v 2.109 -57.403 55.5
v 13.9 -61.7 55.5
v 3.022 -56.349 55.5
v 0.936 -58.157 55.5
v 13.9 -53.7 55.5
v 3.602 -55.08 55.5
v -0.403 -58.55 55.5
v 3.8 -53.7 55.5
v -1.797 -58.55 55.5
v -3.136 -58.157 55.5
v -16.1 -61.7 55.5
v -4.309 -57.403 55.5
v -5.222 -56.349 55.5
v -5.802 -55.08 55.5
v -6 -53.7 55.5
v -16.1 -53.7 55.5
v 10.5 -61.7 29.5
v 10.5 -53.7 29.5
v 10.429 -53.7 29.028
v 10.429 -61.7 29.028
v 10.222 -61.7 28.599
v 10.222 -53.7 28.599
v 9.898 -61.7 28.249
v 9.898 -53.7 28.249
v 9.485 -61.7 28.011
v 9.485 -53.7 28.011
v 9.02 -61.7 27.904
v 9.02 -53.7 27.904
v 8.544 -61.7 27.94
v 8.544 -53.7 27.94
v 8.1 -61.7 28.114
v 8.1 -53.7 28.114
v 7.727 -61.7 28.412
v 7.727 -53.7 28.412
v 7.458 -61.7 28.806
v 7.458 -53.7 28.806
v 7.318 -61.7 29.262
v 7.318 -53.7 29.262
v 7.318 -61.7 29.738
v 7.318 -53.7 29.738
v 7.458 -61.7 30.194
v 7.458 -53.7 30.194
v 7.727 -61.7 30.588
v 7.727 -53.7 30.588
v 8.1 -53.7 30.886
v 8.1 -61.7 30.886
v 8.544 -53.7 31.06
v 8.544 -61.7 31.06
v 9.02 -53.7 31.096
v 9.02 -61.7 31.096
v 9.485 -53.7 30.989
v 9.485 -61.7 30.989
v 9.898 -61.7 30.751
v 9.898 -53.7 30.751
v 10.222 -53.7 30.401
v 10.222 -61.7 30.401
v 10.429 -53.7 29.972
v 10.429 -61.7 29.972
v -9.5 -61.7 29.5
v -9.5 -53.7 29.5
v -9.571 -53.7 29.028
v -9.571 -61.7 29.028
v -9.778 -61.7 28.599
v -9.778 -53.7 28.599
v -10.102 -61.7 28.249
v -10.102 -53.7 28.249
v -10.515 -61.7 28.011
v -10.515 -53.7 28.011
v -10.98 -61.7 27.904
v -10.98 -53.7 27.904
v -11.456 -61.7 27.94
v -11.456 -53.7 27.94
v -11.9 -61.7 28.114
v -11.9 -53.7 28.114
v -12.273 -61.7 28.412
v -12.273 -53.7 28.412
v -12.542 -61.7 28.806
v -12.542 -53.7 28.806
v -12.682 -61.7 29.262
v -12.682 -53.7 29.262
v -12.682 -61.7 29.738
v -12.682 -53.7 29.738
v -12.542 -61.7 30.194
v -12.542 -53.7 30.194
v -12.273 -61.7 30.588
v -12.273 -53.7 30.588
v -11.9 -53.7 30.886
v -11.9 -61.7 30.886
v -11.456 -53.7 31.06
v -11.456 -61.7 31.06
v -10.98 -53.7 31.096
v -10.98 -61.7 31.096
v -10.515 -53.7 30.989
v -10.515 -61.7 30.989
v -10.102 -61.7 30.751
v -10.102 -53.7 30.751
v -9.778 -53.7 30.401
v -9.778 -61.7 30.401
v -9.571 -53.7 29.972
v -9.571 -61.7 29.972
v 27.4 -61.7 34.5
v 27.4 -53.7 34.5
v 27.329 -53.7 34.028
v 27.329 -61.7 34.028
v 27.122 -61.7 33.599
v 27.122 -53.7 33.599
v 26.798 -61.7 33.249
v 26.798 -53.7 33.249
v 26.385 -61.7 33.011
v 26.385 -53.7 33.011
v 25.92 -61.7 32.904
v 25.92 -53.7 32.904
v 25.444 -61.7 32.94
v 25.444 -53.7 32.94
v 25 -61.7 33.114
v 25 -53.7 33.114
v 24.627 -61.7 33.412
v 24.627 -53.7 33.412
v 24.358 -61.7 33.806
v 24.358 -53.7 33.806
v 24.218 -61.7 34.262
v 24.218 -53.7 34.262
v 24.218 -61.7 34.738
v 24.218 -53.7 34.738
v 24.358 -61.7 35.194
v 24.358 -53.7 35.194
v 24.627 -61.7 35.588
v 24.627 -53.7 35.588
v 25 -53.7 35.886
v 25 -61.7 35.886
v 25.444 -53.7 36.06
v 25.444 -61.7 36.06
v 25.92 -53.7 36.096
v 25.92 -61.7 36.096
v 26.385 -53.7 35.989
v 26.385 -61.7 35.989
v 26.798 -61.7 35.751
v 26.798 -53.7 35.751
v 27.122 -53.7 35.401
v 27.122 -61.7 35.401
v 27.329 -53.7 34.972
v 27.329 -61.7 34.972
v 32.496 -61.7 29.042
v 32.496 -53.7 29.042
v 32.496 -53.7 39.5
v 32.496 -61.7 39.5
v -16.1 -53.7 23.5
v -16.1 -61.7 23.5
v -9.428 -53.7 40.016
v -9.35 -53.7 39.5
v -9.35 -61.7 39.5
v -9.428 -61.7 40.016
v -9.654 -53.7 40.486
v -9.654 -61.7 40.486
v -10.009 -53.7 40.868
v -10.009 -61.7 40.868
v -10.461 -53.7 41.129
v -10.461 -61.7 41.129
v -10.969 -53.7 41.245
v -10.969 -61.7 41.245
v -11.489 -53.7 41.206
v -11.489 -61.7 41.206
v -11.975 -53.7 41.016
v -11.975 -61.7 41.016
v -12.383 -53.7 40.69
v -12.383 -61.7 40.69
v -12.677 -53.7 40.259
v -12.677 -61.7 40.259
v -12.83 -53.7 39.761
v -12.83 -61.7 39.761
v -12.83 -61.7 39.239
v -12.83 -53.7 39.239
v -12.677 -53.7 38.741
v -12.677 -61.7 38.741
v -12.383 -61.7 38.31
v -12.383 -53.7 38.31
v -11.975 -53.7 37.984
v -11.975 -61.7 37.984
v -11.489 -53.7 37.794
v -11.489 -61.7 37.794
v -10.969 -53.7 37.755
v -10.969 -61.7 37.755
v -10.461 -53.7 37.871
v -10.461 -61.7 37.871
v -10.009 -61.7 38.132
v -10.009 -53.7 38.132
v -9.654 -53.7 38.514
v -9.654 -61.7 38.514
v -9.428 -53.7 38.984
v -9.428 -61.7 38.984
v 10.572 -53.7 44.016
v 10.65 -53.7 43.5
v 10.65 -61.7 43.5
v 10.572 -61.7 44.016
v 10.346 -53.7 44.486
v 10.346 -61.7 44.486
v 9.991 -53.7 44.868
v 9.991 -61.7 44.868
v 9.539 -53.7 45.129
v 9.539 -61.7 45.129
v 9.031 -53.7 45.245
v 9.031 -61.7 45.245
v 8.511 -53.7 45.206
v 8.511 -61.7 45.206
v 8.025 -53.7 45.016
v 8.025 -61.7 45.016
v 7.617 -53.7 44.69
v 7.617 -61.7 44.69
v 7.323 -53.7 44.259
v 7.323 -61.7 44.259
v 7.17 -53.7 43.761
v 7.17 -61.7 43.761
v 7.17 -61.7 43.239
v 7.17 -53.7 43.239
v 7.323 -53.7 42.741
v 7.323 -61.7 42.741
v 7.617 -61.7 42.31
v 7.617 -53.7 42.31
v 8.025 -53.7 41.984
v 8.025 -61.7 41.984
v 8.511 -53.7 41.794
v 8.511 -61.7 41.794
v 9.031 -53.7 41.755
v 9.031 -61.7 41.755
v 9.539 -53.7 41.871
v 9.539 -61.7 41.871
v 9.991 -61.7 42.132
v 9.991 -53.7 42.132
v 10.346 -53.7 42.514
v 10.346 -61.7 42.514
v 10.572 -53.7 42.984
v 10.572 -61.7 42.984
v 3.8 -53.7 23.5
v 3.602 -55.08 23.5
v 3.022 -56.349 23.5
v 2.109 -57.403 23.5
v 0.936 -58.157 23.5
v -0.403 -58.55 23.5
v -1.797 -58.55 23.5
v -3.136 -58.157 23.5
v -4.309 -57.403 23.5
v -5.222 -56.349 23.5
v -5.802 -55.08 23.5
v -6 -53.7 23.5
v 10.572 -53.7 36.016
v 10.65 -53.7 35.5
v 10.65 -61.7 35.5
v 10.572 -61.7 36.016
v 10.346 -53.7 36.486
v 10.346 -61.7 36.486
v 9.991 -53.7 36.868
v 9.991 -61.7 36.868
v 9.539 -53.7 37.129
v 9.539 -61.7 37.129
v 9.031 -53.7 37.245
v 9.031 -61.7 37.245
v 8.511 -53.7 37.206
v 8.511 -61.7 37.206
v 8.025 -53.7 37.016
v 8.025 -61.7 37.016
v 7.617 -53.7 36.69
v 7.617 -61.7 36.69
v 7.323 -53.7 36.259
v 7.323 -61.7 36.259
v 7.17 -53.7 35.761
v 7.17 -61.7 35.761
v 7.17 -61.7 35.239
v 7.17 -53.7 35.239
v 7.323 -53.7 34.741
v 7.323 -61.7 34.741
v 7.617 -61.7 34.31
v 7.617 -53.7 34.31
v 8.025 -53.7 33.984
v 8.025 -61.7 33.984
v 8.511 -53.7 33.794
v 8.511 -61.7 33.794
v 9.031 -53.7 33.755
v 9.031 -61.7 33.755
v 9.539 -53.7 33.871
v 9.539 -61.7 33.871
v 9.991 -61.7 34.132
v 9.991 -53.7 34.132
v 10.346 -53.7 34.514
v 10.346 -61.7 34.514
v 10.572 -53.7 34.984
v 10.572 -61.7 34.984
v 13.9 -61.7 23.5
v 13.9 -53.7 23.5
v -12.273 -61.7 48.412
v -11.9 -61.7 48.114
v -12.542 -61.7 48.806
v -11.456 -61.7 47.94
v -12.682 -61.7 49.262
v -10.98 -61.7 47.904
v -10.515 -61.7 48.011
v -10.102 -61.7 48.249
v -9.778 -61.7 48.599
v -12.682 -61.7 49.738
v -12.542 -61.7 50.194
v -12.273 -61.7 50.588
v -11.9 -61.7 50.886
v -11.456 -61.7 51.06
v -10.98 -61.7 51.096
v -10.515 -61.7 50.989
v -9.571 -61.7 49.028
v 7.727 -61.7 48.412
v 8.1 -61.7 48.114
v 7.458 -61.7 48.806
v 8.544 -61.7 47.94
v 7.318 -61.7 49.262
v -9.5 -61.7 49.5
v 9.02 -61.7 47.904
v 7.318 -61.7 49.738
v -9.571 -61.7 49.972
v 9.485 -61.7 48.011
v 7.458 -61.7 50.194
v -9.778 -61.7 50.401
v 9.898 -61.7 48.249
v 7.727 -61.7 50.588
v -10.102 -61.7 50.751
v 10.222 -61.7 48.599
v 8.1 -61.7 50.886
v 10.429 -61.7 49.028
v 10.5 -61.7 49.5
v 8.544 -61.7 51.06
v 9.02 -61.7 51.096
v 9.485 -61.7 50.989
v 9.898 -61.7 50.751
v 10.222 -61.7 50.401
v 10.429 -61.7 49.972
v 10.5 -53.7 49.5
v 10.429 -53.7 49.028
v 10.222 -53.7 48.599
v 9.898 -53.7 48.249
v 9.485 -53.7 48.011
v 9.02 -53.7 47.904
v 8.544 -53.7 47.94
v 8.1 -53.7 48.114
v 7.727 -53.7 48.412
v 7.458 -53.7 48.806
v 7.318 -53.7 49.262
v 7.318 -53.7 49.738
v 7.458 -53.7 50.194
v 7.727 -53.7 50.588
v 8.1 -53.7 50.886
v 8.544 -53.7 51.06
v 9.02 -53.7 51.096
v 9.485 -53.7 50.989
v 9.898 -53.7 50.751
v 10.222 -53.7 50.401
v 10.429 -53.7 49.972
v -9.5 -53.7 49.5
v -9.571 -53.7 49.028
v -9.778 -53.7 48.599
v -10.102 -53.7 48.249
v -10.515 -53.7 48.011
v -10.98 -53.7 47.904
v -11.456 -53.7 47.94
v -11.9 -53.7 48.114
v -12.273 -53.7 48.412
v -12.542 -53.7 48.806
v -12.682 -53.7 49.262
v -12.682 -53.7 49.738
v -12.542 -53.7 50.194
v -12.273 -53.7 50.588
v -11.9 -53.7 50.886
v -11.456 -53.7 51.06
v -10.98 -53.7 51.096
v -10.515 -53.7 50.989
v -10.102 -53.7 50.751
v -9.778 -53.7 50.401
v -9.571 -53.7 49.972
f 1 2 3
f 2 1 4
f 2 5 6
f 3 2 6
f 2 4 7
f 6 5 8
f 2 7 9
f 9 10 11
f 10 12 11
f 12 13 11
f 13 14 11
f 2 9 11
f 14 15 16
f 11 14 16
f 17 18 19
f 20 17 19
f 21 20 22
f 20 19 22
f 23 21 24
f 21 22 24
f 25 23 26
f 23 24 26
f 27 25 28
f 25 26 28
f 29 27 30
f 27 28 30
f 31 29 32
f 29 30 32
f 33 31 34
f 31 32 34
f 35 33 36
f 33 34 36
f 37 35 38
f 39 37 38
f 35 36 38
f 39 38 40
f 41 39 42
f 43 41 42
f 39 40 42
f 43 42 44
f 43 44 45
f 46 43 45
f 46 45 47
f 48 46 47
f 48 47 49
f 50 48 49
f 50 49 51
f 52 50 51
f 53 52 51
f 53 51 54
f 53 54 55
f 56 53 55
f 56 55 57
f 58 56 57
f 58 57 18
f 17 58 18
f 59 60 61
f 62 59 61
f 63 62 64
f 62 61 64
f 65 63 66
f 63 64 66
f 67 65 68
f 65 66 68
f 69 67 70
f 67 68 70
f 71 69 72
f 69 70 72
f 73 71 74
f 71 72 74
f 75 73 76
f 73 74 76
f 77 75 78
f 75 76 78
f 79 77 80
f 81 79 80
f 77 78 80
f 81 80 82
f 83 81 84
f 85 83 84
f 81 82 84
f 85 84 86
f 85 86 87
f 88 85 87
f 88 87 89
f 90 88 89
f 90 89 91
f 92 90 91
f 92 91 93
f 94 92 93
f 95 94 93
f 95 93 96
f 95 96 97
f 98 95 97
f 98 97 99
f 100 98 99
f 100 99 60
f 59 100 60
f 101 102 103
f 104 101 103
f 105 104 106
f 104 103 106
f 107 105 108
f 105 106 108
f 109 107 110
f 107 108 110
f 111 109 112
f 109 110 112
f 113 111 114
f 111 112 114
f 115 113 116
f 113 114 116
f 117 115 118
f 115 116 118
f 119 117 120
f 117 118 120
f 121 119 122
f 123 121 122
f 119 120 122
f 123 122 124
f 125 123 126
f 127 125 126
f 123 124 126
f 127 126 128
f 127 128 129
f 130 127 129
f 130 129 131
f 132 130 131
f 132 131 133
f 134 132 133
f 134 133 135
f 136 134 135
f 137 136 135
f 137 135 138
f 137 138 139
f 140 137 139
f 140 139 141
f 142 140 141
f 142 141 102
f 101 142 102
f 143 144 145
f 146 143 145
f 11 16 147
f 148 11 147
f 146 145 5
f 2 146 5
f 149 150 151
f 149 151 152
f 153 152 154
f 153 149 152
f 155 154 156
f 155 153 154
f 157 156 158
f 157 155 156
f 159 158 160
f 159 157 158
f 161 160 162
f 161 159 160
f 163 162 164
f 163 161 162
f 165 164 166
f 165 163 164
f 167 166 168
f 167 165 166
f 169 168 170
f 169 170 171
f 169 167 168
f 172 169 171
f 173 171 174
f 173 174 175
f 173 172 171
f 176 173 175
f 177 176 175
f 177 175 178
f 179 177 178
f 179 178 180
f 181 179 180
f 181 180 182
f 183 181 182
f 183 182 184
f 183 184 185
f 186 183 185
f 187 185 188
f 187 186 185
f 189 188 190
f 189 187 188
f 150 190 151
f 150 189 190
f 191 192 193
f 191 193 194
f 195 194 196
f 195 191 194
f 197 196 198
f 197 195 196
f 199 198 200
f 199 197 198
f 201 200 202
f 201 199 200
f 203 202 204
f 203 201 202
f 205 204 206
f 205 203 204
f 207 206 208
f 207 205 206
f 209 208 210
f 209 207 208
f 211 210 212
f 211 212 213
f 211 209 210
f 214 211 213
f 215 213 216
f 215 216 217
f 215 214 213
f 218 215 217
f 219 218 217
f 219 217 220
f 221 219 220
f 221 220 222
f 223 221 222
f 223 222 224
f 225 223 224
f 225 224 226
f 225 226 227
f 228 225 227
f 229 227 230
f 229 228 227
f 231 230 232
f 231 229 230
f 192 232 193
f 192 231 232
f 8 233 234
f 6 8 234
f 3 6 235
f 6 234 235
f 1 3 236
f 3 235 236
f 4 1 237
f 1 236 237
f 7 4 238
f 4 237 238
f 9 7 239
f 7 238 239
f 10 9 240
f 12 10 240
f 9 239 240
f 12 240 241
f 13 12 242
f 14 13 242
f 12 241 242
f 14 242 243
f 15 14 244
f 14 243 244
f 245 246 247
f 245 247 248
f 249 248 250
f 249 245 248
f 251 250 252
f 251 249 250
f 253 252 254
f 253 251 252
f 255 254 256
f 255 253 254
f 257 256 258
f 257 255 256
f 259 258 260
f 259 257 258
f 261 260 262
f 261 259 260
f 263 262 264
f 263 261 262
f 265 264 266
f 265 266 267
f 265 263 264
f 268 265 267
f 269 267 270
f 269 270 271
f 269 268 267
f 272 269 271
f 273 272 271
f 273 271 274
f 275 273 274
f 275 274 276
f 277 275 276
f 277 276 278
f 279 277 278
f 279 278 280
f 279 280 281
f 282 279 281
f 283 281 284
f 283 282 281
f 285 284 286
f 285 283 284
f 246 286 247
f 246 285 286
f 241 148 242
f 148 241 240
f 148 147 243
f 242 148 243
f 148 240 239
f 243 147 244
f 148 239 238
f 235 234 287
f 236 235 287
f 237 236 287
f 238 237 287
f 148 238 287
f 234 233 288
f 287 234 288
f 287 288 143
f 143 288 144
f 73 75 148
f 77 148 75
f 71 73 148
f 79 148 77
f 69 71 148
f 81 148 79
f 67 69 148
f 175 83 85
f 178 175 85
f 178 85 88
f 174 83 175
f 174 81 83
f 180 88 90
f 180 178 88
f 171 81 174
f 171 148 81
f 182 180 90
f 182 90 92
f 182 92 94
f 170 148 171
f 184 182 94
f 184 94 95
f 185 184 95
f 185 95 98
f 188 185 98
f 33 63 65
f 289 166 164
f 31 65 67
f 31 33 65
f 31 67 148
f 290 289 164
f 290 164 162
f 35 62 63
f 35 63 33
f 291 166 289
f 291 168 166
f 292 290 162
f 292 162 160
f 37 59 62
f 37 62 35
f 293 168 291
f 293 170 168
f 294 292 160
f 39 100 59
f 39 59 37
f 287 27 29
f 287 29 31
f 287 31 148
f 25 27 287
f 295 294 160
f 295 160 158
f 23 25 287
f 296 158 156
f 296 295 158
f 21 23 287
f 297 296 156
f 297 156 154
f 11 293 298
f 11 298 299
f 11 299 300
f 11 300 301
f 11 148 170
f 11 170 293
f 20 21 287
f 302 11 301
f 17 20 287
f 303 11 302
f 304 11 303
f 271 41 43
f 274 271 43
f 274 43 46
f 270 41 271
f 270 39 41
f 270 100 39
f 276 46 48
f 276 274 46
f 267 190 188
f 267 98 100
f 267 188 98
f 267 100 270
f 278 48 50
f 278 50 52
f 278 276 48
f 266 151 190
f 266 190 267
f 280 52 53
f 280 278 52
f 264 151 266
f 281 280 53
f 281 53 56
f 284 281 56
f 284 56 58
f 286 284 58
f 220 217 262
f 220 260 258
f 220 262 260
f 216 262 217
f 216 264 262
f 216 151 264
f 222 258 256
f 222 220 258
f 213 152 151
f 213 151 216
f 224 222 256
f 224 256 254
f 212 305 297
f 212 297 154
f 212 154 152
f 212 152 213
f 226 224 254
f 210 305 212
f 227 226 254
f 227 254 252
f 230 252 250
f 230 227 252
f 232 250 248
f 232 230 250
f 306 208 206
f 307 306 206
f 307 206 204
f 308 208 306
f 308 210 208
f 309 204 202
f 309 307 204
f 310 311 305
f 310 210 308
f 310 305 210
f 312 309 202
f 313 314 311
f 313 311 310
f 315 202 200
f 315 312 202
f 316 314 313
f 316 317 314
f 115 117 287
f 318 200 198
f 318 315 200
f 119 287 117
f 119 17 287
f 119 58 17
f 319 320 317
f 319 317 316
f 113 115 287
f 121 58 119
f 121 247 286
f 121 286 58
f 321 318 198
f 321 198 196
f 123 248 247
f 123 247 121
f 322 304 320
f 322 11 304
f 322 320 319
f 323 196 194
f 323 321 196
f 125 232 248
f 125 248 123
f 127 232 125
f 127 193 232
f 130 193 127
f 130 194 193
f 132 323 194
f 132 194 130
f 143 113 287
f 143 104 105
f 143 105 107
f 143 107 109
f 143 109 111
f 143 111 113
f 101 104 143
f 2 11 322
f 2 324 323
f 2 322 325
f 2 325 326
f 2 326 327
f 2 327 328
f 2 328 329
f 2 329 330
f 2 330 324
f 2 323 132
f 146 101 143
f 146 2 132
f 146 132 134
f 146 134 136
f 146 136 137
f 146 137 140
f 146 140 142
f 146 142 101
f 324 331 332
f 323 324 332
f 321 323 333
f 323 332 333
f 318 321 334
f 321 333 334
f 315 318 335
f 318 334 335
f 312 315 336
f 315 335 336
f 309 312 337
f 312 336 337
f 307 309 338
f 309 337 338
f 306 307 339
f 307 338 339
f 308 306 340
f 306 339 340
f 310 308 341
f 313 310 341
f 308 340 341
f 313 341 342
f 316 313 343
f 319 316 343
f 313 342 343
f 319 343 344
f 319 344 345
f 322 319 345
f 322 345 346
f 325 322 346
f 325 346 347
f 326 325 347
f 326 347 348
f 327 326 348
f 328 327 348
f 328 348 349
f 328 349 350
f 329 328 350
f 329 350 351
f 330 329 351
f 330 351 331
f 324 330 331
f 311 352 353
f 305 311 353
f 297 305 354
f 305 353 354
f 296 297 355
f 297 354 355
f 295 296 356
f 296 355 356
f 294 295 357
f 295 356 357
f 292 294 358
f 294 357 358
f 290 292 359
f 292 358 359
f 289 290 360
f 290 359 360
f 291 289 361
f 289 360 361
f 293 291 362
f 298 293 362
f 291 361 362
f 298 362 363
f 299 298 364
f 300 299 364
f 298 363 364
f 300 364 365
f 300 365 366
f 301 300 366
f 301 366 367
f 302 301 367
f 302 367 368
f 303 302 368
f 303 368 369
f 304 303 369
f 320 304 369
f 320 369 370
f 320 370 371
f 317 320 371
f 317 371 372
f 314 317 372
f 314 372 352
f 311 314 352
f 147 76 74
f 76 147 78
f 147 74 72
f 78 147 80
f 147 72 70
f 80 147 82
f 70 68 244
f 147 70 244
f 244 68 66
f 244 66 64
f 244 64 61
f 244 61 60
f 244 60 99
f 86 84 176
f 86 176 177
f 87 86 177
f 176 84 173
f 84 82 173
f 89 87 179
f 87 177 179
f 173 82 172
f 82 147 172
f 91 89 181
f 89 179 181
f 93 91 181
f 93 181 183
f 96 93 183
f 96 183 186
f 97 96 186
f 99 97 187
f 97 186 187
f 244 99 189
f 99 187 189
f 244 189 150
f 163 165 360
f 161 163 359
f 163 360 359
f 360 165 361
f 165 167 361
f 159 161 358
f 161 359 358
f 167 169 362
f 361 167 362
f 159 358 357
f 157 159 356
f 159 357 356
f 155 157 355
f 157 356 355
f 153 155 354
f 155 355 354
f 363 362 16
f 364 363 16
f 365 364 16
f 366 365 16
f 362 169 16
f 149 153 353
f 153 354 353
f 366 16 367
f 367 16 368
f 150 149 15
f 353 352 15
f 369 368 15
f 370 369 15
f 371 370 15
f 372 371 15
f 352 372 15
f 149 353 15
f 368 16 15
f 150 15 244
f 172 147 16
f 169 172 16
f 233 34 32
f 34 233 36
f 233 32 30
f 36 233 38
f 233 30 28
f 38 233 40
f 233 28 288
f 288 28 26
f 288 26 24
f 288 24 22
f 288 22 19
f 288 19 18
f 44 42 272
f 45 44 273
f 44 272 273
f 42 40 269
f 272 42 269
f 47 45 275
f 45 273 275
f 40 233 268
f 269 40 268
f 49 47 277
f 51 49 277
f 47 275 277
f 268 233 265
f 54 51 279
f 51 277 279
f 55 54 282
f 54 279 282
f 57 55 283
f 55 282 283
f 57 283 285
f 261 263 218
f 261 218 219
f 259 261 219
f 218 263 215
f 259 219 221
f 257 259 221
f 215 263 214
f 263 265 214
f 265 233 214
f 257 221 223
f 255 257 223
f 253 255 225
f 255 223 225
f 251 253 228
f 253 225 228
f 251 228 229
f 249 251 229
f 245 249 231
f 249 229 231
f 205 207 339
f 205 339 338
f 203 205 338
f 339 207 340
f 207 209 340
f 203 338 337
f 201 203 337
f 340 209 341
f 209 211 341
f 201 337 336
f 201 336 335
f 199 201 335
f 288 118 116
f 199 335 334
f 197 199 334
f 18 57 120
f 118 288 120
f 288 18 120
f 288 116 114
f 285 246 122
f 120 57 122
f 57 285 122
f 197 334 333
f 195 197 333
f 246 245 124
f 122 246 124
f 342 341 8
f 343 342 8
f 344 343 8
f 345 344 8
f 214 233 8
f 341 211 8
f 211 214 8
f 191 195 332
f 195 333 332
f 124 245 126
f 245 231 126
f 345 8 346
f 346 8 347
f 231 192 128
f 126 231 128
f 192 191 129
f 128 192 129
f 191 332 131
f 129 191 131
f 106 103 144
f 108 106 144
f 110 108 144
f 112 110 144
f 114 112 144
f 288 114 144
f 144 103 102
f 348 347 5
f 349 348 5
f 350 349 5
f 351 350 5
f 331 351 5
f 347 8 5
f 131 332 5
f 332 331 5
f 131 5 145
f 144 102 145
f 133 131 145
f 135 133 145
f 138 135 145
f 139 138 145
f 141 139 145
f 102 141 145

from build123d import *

# Parameters (mm, degrees)
SKETCH063_R     = 1.75
PAD039_DEPTH    = 8
SKETCH064_R     = 4.9
POCKET025_DEPTH = 38
SKETCH065_R     = 1.6
POCKET026_DEPTH = 10


with BuildPart() as part:
    # Sketch063 → Pad039 (new body)
    with BuildSketch(Plane.XZ):
        Polygon((-15, -16), (15, -16), (33.595724, -10.458334), (33.595724, 0), (15, 16), (-15, 16), align=None)
        with Locations((-10, 0)):
            Circle(SKETCH063_R, mode=Mode.SUBTRACT)
        with Locations((10, 4)):
            Circle(SKETCH063_R, mode=Mode.SUBTRACT)
        with Locations((10, -4)):
            Circle(SKETCH063_R, mode=Mode.SUBTRACT)
    extrude(amount=PAD039_DEPTH)

    # Sketch064 (on Face3 of Pad039) → Pocket025 (cut)
    with BuildSketch(Plane(origin=(0, 0, -16), x_dir=(1, 0, 0), z_dir=(0, 0, -1))):
        Circle(SKETCH064_R)
    extrude(amount=-POCKET025_DEPTH, mode=Mode.SUBTRACT)

    # Sketch065 (on Face2 of Pocket025) → Pocket026 (cut)
    with BuildSketch(Plane(origin=(0, 0, 0), x_dir=(1, 0, 0), z_dir=(0, 1, 0))):
        with Locations((26.9, 5)):
            Circle(SKETCH065_R)
        with Locations((-10, 10)):
            Circle(SKETCH065_R)
        with Locations((10, 10)):
            Circle(SKETCH065_R)
        with Locations((10, -10)):
            Circle(SKETCH065_R)
        with Locations((-10, -10)):
            Circle(SKETCH065_R)
    extrude(amount=-POCKET026_DEPTH, mode=Mode.SUBTRACT)


with BuildPart() as part_1:
    # Body011 placement: moved
    add(part.part.moved(Location((-1.1, -53.7, 39.5))))


solid = part_1.part
